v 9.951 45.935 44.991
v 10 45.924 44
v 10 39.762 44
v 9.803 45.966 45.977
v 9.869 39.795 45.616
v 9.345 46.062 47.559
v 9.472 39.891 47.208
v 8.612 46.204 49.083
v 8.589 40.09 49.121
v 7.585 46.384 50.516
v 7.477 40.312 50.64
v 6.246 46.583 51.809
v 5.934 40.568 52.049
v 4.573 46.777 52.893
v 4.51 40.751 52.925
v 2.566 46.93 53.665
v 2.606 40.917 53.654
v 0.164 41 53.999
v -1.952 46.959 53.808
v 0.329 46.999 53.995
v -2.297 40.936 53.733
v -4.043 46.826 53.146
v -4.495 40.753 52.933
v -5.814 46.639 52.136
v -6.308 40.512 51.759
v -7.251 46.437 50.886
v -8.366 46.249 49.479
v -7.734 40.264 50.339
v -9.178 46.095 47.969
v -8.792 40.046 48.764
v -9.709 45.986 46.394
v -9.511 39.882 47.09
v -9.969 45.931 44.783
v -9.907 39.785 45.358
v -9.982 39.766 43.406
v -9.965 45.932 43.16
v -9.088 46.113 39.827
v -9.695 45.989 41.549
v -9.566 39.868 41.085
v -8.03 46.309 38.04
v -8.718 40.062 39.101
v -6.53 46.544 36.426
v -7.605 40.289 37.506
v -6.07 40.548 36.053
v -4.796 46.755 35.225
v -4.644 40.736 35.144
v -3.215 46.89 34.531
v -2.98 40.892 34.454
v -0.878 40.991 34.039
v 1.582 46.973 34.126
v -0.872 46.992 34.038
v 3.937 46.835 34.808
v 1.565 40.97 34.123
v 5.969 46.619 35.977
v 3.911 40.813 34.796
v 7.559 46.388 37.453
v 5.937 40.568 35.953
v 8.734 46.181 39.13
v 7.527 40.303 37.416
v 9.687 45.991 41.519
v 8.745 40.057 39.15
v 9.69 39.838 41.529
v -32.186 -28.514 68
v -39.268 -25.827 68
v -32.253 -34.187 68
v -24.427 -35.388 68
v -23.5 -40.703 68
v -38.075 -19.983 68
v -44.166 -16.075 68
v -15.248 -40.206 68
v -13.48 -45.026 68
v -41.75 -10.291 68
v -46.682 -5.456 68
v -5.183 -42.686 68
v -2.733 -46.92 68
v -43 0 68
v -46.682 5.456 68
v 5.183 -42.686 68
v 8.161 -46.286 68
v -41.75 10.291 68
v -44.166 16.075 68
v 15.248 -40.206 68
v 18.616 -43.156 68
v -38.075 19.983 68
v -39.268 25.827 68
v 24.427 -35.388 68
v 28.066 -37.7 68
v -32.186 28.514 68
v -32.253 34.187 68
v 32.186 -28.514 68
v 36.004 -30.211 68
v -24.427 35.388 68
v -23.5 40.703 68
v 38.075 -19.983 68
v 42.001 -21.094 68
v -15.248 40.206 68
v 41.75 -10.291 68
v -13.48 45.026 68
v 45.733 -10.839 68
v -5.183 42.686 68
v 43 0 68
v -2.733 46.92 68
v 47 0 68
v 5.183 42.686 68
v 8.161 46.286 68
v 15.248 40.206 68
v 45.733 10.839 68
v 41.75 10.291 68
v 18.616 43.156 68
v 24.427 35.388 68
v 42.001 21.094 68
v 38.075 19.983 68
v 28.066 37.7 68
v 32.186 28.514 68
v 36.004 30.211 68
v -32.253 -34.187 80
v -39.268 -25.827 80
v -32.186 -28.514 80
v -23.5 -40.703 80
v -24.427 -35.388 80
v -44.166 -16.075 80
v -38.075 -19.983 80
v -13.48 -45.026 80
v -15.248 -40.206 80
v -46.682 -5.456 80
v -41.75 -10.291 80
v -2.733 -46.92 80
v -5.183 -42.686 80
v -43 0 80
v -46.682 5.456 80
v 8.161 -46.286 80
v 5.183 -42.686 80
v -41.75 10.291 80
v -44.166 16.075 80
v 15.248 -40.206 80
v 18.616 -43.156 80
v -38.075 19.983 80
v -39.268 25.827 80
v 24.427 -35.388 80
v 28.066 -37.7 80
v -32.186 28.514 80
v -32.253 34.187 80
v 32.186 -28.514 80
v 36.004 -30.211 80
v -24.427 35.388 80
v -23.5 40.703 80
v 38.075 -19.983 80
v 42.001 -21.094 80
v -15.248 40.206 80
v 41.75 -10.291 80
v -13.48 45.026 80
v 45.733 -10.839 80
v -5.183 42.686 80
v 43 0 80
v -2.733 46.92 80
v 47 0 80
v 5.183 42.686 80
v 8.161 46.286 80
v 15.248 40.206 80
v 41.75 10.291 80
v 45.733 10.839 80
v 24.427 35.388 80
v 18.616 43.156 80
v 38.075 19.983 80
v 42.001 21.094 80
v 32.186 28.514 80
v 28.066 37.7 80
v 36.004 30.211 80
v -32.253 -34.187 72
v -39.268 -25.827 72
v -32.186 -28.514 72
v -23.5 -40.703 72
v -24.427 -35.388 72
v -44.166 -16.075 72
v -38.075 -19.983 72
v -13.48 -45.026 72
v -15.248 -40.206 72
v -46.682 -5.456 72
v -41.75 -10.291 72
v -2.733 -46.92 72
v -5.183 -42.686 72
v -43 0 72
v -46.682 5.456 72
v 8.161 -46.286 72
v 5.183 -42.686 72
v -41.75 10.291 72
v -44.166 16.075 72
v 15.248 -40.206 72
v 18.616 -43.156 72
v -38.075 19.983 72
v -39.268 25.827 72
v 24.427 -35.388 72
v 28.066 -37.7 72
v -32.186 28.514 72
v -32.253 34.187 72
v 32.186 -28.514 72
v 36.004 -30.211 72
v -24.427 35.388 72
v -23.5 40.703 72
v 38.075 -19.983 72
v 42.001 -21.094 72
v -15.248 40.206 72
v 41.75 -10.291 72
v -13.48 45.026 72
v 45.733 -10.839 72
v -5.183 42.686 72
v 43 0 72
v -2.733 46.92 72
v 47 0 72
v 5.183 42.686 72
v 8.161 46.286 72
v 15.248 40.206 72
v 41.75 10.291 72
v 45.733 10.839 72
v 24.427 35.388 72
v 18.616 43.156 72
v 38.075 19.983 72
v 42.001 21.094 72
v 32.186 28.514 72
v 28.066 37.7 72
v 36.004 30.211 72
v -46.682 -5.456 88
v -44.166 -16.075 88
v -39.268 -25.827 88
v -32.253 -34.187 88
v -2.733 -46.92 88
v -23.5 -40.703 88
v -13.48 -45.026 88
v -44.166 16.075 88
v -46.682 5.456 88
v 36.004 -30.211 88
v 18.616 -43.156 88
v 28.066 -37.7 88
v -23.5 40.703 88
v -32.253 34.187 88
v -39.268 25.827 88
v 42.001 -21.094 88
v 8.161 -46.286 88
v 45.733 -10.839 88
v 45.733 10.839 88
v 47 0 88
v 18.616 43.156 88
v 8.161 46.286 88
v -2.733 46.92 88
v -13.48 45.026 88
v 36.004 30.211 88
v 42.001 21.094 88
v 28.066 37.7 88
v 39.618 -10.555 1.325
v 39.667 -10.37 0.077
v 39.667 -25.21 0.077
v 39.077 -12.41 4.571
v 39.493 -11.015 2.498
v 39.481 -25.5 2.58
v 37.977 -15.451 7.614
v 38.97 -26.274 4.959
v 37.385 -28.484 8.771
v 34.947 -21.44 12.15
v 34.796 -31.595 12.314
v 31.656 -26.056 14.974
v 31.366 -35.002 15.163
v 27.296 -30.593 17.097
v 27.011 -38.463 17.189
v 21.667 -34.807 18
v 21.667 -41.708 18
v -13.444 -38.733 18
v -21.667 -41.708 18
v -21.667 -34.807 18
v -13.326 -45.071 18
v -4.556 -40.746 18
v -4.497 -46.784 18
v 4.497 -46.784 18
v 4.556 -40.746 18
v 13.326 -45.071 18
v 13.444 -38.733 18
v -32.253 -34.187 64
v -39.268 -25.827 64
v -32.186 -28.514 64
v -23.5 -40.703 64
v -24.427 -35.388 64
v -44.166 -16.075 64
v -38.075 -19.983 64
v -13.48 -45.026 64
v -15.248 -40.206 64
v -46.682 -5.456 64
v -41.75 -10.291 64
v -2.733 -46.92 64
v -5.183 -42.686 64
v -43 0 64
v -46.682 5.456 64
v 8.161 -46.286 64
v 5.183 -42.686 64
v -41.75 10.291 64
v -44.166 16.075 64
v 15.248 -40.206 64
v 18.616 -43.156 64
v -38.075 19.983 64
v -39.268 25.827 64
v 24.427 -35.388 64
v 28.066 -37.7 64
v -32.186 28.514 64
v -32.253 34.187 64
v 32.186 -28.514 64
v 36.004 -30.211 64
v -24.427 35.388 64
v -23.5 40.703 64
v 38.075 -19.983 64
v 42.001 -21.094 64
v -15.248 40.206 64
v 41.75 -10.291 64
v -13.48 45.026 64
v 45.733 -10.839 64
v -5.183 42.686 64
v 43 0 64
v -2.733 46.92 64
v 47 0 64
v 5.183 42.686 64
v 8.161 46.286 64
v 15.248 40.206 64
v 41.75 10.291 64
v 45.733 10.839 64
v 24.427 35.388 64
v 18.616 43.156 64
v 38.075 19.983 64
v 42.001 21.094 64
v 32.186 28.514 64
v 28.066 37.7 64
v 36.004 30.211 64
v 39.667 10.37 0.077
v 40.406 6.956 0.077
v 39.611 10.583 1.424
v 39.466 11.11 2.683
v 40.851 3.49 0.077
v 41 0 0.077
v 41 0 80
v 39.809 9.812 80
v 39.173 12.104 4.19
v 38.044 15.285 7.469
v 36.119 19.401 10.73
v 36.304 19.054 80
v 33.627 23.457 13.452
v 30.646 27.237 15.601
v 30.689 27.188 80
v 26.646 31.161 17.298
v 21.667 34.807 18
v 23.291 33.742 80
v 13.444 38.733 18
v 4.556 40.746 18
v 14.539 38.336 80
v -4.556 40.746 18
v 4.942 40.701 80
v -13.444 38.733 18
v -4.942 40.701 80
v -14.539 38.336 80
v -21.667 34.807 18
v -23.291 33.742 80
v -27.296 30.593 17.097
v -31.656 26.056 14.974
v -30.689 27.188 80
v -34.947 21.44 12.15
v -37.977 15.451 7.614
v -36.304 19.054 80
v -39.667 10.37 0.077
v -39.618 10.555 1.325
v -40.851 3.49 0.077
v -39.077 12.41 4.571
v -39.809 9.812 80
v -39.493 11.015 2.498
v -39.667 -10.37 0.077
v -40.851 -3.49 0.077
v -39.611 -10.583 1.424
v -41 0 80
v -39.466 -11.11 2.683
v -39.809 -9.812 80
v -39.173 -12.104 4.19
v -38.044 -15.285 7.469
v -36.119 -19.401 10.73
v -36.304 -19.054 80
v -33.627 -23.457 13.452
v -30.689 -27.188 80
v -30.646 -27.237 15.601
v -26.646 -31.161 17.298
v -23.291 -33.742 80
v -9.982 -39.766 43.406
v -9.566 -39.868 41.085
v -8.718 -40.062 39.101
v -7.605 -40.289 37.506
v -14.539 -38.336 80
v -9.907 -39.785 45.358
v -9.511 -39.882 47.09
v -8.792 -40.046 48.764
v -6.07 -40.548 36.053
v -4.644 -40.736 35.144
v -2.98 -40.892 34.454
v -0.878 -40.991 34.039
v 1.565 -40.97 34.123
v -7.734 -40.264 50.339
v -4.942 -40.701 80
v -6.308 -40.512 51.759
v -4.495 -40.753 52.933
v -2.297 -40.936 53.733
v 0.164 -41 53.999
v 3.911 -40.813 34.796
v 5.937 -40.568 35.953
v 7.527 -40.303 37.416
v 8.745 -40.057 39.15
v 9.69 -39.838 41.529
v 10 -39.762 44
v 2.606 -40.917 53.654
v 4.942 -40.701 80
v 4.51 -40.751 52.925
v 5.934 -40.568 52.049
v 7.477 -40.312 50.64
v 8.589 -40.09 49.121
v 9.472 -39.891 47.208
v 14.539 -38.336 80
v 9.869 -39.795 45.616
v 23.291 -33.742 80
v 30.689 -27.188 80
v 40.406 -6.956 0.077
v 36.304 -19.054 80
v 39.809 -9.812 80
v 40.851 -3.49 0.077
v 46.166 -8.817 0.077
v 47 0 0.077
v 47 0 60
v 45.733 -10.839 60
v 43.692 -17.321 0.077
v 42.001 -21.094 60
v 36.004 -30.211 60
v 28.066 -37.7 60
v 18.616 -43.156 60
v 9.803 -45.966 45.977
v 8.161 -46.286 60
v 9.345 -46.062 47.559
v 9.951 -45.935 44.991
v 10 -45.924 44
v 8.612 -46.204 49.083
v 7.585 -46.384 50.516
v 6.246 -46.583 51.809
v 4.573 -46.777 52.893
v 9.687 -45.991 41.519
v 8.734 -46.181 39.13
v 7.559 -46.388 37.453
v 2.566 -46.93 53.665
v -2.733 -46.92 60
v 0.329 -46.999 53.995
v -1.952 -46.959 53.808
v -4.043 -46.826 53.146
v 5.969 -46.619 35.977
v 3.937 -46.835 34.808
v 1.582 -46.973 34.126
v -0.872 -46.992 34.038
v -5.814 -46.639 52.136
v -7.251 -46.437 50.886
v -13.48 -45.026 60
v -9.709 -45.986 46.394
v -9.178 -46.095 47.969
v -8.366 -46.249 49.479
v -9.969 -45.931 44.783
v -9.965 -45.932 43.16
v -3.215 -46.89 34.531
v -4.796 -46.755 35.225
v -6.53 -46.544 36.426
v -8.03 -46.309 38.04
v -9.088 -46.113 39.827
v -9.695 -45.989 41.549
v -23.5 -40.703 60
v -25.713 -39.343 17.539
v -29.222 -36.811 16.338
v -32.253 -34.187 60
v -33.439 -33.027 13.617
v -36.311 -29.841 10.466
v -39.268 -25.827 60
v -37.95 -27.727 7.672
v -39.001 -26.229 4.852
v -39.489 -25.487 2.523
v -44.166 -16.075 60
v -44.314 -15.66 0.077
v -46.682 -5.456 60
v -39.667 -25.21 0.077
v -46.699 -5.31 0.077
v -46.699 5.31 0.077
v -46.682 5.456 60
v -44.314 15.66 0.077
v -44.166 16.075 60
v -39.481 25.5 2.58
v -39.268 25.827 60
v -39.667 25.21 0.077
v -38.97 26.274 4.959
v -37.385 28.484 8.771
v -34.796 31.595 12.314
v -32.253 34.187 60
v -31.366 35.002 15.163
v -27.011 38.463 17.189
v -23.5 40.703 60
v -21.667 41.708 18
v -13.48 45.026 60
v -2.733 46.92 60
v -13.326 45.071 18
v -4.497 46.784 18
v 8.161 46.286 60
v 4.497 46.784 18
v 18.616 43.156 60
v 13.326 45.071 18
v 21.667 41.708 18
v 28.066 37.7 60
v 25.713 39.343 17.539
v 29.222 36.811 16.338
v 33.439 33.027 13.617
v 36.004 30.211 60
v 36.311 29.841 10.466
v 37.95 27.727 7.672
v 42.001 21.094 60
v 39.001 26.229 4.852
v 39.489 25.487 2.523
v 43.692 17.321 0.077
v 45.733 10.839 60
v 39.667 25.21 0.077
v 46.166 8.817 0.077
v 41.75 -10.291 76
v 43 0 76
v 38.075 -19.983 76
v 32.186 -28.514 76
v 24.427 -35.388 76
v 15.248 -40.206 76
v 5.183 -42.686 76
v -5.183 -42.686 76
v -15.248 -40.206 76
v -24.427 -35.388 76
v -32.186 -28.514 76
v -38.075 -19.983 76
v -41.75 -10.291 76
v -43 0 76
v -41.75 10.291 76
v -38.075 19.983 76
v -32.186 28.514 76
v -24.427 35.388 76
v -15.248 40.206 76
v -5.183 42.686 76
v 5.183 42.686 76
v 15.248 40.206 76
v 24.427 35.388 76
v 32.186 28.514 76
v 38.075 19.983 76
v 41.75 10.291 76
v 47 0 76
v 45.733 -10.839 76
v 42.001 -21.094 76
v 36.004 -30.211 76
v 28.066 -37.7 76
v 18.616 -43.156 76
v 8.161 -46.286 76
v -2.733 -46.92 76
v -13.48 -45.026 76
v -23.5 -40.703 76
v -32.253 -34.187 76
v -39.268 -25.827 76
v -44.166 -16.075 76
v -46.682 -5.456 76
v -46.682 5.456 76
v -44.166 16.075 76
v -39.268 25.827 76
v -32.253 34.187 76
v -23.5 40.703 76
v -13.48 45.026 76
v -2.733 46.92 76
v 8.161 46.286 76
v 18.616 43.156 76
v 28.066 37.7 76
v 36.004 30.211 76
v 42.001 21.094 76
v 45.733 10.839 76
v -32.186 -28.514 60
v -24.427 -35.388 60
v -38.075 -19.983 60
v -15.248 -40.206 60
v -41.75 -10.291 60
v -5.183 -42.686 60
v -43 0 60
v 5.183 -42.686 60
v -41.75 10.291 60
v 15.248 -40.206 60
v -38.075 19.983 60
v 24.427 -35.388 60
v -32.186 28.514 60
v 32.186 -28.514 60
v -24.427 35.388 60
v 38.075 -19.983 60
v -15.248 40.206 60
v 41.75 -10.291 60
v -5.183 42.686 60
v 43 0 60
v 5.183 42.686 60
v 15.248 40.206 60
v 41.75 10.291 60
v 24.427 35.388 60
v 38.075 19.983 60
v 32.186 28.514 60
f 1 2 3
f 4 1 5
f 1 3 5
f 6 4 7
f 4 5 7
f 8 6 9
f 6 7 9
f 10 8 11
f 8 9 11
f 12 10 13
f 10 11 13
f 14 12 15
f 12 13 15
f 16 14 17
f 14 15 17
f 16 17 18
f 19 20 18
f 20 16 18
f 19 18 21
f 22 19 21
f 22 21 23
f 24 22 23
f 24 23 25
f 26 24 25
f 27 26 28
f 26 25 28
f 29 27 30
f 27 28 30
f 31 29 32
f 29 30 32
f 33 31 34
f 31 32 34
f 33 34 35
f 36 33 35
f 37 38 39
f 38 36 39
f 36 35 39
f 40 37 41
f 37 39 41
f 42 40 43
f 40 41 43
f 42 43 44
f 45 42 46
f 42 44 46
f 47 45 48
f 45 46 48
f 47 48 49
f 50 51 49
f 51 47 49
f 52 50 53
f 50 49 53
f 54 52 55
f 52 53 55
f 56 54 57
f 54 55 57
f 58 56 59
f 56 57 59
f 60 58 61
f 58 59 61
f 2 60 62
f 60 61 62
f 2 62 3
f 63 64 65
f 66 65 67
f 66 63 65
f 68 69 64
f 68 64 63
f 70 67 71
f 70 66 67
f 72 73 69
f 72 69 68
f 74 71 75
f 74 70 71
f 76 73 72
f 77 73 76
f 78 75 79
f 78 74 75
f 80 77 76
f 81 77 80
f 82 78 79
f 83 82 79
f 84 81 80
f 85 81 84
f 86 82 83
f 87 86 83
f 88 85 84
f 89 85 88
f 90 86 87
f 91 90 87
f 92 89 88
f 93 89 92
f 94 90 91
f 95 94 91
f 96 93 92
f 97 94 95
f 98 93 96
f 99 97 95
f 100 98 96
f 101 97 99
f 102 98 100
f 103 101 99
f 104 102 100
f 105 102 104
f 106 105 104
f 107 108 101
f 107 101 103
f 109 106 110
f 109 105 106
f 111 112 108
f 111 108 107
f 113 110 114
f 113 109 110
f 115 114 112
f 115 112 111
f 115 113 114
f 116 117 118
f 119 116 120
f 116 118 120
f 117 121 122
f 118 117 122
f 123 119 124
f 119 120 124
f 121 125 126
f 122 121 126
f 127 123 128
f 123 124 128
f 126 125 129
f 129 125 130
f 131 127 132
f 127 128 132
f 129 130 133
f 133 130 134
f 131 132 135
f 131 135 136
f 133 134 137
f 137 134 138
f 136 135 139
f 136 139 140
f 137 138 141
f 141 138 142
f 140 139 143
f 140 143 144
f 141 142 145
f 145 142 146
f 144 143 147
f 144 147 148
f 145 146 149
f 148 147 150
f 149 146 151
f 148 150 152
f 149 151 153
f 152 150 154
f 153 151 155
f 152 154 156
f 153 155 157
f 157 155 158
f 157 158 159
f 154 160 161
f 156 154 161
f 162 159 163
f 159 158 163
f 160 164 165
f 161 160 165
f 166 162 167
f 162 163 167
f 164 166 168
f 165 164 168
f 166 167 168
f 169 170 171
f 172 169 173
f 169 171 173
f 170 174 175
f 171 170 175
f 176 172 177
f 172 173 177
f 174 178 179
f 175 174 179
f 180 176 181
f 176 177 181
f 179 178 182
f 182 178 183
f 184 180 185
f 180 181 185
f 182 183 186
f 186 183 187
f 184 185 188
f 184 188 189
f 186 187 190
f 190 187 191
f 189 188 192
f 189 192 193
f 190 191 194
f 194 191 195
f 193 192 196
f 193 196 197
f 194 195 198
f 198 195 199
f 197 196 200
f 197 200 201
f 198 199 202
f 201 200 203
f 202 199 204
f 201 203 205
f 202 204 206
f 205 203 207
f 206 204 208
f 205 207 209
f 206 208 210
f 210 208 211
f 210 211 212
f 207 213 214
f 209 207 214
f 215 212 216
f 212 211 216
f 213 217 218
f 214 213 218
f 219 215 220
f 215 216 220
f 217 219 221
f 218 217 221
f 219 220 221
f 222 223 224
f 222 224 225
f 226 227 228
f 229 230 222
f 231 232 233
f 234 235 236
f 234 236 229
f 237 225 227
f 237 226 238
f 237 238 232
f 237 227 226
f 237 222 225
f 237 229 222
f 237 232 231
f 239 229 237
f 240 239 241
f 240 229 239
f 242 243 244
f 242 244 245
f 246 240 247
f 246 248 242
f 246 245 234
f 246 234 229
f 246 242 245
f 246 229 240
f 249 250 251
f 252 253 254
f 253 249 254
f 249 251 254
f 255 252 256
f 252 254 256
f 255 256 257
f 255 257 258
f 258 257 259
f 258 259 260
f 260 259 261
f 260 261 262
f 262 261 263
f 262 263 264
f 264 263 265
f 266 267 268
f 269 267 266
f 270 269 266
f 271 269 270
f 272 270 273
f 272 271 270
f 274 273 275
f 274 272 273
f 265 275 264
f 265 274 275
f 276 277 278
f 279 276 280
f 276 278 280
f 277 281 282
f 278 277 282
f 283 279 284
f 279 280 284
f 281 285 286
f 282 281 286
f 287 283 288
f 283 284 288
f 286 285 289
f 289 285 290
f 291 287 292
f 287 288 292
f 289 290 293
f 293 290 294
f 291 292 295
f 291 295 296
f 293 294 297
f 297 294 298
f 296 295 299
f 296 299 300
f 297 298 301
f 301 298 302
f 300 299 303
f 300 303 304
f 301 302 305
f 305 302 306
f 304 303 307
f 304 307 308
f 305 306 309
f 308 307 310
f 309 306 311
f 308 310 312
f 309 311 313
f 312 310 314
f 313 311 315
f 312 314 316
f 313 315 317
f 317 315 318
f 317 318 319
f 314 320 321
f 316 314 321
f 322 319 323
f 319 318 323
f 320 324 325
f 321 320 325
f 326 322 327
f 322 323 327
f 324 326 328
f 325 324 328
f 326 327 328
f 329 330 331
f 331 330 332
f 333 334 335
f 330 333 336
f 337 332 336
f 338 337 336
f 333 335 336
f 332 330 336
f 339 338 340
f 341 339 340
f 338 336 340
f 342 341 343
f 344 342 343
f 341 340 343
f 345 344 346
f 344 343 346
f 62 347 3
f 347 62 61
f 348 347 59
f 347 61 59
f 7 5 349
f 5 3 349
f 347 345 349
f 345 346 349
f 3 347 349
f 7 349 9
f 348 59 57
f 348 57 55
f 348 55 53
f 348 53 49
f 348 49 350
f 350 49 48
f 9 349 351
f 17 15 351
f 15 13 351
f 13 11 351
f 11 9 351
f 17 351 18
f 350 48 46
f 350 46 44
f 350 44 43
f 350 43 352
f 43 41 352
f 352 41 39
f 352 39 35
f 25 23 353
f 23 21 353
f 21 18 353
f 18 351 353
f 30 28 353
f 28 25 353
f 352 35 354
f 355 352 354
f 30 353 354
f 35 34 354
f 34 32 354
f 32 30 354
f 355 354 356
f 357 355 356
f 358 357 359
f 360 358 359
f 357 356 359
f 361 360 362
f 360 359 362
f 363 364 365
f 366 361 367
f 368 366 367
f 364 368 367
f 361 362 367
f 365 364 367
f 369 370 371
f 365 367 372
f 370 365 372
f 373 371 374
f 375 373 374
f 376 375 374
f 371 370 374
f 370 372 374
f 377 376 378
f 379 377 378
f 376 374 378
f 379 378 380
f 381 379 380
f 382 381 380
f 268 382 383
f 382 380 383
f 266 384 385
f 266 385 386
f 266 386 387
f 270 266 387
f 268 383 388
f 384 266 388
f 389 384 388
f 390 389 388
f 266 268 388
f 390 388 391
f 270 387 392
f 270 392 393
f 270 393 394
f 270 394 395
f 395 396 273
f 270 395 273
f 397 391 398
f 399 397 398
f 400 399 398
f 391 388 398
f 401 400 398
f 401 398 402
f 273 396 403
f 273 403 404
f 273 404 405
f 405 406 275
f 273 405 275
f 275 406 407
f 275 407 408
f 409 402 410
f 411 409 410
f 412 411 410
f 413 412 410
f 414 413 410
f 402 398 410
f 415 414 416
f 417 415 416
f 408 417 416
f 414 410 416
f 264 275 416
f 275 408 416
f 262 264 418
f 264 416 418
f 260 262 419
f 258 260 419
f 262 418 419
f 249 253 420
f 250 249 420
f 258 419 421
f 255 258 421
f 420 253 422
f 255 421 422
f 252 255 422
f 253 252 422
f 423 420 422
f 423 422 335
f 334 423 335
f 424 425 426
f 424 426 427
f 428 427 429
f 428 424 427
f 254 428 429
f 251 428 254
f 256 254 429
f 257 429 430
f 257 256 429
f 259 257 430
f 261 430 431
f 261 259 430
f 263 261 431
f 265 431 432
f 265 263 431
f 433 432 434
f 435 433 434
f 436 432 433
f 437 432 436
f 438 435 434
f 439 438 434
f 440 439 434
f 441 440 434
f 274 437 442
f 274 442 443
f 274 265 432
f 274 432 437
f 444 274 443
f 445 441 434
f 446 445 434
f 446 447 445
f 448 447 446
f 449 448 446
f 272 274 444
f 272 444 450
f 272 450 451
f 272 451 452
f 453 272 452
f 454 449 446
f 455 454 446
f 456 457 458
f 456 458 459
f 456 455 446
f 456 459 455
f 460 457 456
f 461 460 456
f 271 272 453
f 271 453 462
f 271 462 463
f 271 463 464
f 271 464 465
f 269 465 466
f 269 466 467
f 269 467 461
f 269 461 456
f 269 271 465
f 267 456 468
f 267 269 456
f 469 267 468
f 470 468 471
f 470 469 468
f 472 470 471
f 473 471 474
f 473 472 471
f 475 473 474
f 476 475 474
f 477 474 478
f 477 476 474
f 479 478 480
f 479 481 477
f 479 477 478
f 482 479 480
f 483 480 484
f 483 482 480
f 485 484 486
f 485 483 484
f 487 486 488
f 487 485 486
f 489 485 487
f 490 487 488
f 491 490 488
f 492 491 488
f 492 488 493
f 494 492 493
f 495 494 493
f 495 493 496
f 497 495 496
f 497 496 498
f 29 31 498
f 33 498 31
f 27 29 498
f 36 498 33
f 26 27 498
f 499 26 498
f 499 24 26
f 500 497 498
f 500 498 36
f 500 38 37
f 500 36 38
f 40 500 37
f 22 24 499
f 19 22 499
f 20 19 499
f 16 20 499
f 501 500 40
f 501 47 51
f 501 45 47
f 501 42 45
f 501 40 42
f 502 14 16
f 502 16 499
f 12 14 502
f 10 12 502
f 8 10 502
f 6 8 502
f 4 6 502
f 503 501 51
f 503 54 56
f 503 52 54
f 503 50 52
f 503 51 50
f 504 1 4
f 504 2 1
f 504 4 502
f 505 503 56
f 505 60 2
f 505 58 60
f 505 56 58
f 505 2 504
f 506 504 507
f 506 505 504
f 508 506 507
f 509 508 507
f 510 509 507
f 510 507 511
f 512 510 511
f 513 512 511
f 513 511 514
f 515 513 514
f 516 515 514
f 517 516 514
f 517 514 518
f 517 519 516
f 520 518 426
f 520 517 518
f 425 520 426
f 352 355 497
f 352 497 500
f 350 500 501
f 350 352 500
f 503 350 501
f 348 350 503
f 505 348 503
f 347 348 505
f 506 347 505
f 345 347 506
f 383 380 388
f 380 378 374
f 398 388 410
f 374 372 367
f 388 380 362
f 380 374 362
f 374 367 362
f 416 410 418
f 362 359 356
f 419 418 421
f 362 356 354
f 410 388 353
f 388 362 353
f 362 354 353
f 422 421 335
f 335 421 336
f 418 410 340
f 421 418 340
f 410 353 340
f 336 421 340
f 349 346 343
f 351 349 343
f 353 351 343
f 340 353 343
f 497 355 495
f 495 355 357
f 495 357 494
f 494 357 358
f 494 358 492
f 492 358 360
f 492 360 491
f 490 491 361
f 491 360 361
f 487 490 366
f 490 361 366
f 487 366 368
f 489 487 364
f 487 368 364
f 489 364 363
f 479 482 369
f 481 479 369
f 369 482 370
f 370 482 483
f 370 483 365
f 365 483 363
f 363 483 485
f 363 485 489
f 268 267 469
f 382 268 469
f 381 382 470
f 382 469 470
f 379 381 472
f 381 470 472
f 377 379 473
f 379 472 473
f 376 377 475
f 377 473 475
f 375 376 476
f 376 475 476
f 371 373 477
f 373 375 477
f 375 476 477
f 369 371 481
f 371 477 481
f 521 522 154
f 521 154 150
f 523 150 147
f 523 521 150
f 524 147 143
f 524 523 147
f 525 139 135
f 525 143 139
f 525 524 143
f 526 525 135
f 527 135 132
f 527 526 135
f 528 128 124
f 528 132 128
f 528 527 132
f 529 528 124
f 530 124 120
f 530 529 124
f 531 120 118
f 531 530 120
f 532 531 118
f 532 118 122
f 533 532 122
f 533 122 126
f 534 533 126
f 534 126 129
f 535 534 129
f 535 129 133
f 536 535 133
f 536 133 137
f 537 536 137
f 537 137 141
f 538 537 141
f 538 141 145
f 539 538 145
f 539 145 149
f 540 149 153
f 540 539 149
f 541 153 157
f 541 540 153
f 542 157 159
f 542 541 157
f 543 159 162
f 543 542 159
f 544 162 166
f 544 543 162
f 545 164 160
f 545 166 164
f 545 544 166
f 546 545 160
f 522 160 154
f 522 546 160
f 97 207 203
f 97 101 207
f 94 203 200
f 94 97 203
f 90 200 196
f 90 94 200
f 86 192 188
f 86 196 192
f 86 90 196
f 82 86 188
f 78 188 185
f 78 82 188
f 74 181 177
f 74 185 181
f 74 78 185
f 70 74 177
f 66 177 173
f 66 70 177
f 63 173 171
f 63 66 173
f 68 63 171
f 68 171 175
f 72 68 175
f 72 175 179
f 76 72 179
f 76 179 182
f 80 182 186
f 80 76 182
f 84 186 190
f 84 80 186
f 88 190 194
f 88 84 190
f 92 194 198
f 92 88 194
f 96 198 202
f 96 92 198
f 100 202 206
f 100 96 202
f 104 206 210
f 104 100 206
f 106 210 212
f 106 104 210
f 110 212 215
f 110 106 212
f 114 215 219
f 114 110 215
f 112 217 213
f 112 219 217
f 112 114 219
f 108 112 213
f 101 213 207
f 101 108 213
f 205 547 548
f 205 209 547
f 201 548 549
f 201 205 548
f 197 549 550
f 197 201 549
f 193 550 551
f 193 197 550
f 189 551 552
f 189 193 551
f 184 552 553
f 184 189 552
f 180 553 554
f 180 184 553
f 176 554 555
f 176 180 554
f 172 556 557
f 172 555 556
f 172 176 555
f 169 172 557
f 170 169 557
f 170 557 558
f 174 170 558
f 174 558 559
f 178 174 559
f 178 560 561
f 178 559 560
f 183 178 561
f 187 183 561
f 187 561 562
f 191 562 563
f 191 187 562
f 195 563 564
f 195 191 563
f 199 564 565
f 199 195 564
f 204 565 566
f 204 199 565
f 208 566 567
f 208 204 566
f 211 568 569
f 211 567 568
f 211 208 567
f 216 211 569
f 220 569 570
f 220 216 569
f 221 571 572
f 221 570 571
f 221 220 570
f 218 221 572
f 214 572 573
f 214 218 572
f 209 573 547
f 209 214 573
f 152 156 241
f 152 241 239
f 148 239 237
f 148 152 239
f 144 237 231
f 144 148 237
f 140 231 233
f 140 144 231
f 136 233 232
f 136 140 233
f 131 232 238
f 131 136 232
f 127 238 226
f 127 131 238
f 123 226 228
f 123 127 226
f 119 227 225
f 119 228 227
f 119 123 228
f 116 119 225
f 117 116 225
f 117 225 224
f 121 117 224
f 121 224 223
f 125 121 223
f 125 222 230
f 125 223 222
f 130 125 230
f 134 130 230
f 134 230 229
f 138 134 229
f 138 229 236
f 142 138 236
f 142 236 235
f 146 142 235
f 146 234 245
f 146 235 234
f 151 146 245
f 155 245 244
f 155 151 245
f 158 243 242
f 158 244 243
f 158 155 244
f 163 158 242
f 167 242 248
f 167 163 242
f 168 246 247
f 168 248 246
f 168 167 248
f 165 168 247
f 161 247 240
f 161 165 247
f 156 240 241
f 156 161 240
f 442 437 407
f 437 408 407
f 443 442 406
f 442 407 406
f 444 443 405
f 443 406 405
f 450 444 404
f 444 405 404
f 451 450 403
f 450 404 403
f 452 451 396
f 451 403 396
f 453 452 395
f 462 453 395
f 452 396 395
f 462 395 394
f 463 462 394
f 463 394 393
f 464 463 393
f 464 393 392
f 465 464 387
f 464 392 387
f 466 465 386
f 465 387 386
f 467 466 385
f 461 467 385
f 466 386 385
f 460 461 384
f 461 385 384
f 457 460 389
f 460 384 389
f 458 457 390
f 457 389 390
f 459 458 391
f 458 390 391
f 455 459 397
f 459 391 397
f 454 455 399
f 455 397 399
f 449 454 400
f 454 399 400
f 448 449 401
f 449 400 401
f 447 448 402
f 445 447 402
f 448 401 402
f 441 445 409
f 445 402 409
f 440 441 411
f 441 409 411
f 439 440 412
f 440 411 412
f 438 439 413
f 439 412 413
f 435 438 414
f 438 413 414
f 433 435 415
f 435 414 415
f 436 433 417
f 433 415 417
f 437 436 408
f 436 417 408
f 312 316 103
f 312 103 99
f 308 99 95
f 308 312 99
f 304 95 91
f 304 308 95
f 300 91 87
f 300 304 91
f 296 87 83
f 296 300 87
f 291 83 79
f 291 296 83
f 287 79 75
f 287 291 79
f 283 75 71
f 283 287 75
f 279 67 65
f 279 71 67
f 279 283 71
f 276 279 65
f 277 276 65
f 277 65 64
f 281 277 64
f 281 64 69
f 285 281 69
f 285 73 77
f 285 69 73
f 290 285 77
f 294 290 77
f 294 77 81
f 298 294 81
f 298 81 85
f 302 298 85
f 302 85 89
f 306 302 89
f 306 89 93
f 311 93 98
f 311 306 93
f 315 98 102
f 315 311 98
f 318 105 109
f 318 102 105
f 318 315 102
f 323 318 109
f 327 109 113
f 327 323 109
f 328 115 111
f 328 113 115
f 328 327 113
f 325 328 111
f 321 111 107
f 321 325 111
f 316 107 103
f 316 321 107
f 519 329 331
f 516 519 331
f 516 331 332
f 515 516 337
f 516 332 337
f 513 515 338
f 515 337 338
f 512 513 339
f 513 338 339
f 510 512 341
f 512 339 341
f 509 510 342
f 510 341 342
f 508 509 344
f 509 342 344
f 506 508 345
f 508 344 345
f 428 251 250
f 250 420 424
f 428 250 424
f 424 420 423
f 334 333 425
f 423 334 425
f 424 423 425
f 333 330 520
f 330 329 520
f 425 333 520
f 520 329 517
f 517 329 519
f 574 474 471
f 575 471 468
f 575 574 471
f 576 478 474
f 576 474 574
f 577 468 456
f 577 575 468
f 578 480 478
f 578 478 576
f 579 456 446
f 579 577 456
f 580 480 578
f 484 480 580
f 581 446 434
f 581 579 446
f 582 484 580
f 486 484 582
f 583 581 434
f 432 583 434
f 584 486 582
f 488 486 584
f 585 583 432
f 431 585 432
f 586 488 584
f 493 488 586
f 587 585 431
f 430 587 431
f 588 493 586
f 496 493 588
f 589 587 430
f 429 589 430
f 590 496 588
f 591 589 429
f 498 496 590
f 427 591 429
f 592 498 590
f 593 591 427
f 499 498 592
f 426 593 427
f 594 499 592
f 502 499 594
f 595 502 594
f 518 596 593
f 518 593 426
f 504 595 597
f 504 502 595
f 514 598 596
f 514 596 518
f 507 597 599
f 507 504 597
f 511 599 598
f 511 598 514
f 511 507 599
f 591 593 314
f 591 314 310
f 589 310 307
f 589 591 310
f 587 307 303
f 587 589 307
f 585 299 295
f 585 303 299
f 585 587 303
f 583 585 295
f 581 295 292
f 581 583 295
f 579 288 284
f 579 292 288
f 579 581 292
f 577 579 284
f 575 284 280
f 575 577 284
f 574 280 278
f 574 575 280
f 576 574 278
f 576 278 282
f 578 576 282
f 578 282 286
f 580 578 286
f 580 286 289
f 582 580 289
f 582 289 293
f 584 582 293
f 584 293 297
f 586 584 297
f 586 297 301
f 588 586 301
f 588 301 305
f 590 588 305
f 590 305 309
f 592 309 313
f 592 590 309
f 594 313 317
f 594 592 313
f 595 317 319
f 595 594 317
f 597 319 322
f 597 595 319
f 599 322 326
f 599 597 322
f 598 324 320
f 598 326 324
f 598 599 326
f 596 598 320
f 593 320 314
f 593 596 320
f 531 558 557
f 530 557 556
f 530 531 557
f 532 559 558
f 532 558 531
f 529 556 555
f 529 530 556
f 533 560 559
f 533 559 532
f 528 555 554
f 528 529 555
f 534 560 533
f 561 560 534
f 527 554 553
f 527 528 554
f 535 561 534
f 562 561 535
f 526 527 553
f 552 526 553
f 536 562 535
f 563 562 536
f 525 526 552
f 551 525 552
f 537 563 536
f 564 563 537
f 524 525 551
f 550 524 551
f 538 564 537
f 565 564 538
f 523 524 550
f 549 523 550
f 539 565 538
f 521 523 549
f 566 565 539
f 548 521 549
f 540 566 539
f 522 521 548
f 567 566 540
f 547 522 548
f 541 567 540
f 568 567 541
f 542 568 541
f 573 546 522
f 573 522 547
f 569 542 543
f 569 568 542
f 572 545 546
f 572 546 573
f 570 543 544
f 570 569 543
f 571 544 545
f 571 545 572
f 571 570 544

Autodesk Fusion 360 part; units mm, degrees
sketch "Sketch1" plane through (0, 0, 0) normal (0, 1, 0) x (1, 0, 0)
  line L0 (0, 0) -> (0, -88)
  line L1 (0, -88) -> (47, -88)
  line L2 (47, -88) -> (47, -80)
  line L3 (47, -80) -> (43, -80)
  line L4 (43, -80) -> (43, -76)
  line L5 (43, -76) -> (47, -76)
  line L6 (47, -76) -> (47, -72)
  line L7 (47, -72) -> (43, -72)
  line L8 (43, -72) -> (43, -68)
  line L9 (43, -68) -> (47, -68)
  line L10 (47, -68) -> (47, -64)
  line L11 (47, -64) -> (43, -64)
  line L12 (43, -64) -> (43, -60)
  line L13 (43, -60) -> (47, -60)
  line L14 (47, -60) -> (47, -0.077)
  line L15 (47, -0.077) -> (41, -0.077)
  line L16 (41, -0.077) -> (41, -80)
  line L17 (41, -80) -> (0, -80)
  dimension "d1" = 88
  dimension "d2" = 47
  dimension "d3" = 8
  dimension "d4" = 4
  dimension "d5" = 4
  dimension "d6" = 4
  dimension "d7" = 4
  dimension "d8" = 4
  dimension "d9" = 4
  dimension "d10" = 4
  dimension "d11" = 4
  dimension "d12" = 4
  dimension "d13" = 4
  dimension "d14" = 4
  dimension "d16" = 6
revolve "Revolve1" add sketch "Sketch1" angle 360 about axis through (0, 0, 0) along (0, 0, 1)
sketch "Sketch2" plane through (0, 0, 0) normal (0, 1, 0) x (1, 0, 0)
  line L0 (-46.9446, 0) -> (-39.667, 0)
  line L1 (-21.667, -18) -> (0, -18)
  line L2 (0, 0) -> (0, -37.5033) construction
  arc A0 (-39.667, 0) -> (-21.667, -18) centre (-21.667, 0) ccw
  line L3 (21.667, -18) -> (0, -18)
  arc A1 (21.667, -18) -> (39.667, 0) centre (21.667, 0) ccw
  circle A2 centre (0, -44) radius 10
  line L4 (-39.667, 0) -> (39.667, 0)
  point P0 (-39.667, -18)
  dimension "d17" = 18
  dimension "d18" = 18
  dimension "d19" = 20
  dimension "d20" = 44
extrude "Extrude1" cut sketch "Sketch2" along normal mid plane 180
